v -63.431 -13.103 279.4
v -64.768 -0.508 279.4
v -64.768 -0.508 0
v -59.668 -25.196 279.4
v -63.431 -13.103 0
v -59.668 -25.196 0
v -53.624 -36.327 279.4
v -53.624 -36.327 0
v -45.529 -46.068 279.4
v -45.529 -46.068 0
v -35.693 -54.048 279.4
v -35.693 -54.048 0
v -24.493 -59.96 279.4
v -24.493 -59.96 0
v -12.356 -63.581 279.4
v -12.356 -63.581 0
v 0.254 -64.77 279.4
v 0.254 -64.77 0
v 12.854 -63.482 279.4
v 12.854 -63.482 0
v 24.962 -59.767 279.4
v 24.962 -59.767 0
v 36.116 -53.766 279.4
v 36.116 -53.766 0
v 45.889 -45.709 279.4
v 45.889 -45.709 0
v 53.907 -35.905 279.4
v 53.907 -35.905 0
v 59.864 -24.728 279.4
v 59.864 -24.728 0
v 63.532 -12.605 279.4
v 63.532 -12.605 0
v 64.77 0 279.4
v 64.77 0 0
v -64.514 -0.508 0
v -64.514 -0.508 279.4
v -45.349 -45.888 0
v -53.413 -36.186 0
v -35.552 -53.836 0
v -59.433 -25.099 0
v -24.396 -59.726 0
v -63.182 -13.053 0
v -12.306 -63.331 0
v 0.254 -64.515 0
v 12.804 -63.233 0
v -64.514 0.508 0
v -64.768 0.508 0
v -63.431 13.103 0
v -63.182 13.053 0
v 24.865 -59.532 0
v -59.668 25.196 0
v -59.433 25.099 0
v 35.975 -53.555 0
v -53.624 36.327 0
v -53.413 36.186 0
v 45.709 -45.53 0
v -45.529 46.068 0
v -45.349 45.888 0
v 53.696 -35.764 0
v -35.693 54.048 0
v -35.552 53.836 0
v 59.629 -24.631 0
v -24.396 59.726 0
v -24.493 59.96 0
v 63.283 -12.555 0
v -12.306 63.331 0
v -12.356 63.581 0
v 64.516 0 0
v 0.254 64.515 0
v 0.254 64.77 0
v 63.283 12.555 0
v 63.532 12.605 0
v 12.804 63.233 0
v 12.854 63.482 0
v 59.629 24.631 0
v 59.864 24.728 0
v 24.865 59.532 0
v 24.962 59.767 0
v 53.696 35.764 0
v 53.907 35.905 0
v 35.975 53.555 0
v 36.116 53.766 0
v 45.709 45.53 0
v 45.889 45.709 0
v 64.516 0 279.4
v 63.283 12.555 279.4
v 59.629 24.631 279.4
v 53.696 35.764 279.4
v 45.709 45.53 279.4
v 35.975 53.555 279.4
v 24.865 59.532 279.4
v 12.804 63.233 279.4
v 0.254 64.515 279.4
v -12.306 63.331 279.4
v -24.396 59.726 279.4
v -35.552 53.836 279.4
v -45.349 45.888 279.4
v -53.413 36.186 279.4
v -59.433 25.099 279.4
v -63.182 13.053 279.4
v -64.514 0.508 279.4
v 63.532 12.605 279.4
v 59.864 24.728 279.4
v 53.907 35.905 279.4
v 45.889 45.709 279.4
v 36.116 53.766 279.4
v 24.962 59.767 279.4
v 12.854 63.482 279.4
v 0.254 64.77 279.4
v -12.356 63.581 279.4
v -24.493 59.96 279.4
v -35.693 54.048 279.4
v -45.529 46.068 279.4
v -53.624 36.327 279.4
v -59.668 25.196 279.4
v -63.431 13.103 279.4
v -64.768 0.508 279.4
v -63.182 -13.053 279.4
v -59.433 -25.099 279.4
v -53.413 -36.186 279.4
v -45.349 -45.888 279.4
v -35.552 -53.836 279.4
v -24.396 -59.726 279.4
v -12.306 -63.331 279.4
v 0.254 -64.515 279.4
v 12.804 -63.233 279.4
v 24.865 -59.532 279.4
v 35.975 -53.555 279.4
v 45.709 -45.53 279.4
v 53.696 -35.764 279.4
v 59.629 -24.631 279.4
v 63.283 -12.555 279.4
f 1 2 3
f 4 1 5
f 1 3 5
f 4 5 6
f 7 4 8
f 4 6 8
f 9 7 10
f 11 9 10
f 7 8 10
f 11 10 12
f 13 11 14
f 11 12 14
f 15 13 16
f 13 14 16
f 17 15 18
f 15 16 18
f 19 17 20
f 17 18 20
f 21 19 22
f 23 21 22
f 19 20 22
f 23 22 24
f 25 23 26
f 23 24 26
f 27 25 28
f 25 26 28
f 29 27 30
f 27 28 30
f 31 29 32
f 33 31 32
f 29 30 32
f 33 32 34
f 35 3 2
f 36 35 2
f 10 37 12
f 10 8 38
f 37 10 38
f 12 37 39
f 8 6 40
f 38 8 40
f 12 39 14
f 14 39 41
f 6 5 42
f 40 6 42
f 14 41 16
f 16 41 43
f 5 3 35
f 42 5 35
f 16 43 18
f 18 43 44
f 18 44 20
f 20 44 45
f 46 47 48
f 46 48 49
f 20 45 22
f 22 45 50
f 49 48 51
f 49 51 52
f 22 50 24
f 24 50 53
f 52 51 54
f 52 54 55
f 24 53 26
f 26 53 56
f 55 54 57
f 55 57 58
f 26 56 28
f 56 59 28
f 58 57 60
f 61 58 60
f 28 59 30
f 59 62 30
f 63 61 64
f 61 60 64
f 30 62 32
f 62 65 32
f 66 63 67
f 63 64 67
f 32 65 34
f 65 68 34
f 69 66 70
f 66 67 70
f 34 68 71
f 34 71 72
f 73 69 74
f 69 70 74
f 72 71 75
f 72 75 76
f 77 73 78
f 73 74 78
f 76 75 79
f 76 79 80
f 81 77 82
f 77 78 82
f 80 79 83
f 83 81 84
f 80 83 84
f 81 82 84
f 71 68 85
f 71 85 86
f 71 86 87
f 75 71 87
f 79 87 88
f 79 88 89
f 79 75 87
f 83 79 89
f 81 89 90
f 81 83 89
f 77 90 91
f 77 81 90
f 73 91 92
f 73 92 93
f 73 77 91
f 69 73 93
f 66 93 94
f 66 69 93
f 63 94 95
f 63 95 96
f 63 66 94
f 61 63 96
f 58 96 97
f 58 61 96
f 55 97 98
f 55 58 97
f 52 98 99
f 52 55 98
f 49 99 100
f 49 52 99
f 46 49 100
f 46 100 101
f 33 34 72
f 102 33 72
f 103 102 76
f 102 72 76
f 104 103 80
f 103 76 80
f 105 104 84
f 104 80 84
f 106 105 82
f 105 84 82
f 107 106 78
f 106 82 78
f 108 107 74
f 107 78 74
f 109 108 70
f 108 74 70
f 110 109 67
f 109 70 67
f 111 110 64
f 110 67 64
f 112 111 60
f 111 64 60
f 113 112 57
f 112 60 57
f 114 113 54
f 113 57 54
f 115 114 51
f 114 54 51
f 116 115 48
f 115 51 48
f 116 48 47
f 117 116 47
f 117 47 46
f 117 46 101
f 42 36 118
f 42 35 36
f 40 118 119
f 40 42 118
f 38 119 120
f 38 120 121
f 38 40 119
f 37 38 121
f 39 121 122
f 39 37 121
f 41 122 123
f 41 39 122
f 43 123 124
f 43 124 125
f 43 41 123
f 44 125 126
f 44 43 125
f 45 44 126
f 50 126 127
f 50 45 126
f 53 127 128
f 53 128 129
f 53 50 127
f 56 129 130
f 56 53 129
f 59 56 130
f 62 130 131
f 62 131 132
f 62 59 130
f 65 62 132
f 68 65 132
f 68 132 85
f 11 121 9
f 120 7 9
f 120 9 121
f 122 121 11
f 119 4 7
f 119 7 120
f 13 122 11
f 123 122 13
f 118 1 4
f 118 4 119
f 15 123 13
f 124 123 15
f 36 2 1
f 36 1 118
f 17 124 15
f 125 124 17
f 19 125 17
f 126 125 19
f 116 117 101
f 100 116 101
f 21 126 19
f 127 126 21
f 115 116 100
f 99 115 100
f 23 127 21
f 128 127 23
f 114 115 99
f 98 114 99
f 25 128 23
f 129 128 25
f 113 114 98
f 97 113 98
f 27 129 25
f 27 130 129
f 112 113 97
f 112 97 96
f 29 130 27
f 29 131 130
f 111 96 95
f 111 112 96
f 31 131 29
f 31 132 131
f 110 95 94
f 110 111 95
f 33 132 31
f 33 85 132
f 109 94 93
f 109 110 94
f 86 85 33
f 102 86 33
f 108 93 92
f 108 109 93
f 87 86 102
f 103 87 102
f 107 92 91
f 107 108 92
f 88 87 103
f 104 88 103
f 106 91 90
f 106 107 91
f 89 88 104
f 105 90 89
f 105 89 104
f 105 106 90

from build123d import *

# Parameters (mm, degrees)
SKETCH2_R               = 64.77
SKETCH2_R_2             = 64.516
BOSS_EXTRUDE1_DEPTH     = 279.4
CUT_EXTRUDE1_REACH      = 316.706
CUT_EXTRUDE1_END_RADIUS = 64.516
SKETCH5_W               = 279.4
SKETCH5_H               = 1.016


with BuildPart() as part:
    # Sketch2 → Boss-Extrude1 (new body)
    with BuildSketch(Plane.XY):
        Circle(SKETCH2_R)
        Circle(SKETCH2_R_2, mode=Mode.SUBTRACT)
    extrude(amount=BOSS_EXTRUDE1_DEPTH)

    # Cut-Extrude1: up to this cylinder (the profile starts outside it)
    cut_extrude1_end = Plane(origin=(0, 0, 139.7), z_dir=(0, 0, -1)) * Cylinder(CUT_EXTRUDE1_END_RADIUS, 763.444, mode=Mode.PRIVATE)
    # Sketch5 → Cut-Extrude1 (cut, up to the surface)
    with BuildSketch(Plane.ZY.offset(64.77), mode=Mode.PRIVATE) as cut_extrude1_sk1:
        with Locations((139.7, 0)):
            Rectangle(SKETCH5_W, SKETCH5_H)
    cut_extrude1_tool1 = extrude(cut_extrude1_sk1.sketch, amount=-CUT_EXTRUDE1_REACH, mode=Mode.PRIVATE) - cut_extrude1_end
    add(cut_extrude1_tool1.solids().sort_by_distance((-64.77, 0, 139.7))[0], mode=Mode.SUBTRACT)


solid = part.part
